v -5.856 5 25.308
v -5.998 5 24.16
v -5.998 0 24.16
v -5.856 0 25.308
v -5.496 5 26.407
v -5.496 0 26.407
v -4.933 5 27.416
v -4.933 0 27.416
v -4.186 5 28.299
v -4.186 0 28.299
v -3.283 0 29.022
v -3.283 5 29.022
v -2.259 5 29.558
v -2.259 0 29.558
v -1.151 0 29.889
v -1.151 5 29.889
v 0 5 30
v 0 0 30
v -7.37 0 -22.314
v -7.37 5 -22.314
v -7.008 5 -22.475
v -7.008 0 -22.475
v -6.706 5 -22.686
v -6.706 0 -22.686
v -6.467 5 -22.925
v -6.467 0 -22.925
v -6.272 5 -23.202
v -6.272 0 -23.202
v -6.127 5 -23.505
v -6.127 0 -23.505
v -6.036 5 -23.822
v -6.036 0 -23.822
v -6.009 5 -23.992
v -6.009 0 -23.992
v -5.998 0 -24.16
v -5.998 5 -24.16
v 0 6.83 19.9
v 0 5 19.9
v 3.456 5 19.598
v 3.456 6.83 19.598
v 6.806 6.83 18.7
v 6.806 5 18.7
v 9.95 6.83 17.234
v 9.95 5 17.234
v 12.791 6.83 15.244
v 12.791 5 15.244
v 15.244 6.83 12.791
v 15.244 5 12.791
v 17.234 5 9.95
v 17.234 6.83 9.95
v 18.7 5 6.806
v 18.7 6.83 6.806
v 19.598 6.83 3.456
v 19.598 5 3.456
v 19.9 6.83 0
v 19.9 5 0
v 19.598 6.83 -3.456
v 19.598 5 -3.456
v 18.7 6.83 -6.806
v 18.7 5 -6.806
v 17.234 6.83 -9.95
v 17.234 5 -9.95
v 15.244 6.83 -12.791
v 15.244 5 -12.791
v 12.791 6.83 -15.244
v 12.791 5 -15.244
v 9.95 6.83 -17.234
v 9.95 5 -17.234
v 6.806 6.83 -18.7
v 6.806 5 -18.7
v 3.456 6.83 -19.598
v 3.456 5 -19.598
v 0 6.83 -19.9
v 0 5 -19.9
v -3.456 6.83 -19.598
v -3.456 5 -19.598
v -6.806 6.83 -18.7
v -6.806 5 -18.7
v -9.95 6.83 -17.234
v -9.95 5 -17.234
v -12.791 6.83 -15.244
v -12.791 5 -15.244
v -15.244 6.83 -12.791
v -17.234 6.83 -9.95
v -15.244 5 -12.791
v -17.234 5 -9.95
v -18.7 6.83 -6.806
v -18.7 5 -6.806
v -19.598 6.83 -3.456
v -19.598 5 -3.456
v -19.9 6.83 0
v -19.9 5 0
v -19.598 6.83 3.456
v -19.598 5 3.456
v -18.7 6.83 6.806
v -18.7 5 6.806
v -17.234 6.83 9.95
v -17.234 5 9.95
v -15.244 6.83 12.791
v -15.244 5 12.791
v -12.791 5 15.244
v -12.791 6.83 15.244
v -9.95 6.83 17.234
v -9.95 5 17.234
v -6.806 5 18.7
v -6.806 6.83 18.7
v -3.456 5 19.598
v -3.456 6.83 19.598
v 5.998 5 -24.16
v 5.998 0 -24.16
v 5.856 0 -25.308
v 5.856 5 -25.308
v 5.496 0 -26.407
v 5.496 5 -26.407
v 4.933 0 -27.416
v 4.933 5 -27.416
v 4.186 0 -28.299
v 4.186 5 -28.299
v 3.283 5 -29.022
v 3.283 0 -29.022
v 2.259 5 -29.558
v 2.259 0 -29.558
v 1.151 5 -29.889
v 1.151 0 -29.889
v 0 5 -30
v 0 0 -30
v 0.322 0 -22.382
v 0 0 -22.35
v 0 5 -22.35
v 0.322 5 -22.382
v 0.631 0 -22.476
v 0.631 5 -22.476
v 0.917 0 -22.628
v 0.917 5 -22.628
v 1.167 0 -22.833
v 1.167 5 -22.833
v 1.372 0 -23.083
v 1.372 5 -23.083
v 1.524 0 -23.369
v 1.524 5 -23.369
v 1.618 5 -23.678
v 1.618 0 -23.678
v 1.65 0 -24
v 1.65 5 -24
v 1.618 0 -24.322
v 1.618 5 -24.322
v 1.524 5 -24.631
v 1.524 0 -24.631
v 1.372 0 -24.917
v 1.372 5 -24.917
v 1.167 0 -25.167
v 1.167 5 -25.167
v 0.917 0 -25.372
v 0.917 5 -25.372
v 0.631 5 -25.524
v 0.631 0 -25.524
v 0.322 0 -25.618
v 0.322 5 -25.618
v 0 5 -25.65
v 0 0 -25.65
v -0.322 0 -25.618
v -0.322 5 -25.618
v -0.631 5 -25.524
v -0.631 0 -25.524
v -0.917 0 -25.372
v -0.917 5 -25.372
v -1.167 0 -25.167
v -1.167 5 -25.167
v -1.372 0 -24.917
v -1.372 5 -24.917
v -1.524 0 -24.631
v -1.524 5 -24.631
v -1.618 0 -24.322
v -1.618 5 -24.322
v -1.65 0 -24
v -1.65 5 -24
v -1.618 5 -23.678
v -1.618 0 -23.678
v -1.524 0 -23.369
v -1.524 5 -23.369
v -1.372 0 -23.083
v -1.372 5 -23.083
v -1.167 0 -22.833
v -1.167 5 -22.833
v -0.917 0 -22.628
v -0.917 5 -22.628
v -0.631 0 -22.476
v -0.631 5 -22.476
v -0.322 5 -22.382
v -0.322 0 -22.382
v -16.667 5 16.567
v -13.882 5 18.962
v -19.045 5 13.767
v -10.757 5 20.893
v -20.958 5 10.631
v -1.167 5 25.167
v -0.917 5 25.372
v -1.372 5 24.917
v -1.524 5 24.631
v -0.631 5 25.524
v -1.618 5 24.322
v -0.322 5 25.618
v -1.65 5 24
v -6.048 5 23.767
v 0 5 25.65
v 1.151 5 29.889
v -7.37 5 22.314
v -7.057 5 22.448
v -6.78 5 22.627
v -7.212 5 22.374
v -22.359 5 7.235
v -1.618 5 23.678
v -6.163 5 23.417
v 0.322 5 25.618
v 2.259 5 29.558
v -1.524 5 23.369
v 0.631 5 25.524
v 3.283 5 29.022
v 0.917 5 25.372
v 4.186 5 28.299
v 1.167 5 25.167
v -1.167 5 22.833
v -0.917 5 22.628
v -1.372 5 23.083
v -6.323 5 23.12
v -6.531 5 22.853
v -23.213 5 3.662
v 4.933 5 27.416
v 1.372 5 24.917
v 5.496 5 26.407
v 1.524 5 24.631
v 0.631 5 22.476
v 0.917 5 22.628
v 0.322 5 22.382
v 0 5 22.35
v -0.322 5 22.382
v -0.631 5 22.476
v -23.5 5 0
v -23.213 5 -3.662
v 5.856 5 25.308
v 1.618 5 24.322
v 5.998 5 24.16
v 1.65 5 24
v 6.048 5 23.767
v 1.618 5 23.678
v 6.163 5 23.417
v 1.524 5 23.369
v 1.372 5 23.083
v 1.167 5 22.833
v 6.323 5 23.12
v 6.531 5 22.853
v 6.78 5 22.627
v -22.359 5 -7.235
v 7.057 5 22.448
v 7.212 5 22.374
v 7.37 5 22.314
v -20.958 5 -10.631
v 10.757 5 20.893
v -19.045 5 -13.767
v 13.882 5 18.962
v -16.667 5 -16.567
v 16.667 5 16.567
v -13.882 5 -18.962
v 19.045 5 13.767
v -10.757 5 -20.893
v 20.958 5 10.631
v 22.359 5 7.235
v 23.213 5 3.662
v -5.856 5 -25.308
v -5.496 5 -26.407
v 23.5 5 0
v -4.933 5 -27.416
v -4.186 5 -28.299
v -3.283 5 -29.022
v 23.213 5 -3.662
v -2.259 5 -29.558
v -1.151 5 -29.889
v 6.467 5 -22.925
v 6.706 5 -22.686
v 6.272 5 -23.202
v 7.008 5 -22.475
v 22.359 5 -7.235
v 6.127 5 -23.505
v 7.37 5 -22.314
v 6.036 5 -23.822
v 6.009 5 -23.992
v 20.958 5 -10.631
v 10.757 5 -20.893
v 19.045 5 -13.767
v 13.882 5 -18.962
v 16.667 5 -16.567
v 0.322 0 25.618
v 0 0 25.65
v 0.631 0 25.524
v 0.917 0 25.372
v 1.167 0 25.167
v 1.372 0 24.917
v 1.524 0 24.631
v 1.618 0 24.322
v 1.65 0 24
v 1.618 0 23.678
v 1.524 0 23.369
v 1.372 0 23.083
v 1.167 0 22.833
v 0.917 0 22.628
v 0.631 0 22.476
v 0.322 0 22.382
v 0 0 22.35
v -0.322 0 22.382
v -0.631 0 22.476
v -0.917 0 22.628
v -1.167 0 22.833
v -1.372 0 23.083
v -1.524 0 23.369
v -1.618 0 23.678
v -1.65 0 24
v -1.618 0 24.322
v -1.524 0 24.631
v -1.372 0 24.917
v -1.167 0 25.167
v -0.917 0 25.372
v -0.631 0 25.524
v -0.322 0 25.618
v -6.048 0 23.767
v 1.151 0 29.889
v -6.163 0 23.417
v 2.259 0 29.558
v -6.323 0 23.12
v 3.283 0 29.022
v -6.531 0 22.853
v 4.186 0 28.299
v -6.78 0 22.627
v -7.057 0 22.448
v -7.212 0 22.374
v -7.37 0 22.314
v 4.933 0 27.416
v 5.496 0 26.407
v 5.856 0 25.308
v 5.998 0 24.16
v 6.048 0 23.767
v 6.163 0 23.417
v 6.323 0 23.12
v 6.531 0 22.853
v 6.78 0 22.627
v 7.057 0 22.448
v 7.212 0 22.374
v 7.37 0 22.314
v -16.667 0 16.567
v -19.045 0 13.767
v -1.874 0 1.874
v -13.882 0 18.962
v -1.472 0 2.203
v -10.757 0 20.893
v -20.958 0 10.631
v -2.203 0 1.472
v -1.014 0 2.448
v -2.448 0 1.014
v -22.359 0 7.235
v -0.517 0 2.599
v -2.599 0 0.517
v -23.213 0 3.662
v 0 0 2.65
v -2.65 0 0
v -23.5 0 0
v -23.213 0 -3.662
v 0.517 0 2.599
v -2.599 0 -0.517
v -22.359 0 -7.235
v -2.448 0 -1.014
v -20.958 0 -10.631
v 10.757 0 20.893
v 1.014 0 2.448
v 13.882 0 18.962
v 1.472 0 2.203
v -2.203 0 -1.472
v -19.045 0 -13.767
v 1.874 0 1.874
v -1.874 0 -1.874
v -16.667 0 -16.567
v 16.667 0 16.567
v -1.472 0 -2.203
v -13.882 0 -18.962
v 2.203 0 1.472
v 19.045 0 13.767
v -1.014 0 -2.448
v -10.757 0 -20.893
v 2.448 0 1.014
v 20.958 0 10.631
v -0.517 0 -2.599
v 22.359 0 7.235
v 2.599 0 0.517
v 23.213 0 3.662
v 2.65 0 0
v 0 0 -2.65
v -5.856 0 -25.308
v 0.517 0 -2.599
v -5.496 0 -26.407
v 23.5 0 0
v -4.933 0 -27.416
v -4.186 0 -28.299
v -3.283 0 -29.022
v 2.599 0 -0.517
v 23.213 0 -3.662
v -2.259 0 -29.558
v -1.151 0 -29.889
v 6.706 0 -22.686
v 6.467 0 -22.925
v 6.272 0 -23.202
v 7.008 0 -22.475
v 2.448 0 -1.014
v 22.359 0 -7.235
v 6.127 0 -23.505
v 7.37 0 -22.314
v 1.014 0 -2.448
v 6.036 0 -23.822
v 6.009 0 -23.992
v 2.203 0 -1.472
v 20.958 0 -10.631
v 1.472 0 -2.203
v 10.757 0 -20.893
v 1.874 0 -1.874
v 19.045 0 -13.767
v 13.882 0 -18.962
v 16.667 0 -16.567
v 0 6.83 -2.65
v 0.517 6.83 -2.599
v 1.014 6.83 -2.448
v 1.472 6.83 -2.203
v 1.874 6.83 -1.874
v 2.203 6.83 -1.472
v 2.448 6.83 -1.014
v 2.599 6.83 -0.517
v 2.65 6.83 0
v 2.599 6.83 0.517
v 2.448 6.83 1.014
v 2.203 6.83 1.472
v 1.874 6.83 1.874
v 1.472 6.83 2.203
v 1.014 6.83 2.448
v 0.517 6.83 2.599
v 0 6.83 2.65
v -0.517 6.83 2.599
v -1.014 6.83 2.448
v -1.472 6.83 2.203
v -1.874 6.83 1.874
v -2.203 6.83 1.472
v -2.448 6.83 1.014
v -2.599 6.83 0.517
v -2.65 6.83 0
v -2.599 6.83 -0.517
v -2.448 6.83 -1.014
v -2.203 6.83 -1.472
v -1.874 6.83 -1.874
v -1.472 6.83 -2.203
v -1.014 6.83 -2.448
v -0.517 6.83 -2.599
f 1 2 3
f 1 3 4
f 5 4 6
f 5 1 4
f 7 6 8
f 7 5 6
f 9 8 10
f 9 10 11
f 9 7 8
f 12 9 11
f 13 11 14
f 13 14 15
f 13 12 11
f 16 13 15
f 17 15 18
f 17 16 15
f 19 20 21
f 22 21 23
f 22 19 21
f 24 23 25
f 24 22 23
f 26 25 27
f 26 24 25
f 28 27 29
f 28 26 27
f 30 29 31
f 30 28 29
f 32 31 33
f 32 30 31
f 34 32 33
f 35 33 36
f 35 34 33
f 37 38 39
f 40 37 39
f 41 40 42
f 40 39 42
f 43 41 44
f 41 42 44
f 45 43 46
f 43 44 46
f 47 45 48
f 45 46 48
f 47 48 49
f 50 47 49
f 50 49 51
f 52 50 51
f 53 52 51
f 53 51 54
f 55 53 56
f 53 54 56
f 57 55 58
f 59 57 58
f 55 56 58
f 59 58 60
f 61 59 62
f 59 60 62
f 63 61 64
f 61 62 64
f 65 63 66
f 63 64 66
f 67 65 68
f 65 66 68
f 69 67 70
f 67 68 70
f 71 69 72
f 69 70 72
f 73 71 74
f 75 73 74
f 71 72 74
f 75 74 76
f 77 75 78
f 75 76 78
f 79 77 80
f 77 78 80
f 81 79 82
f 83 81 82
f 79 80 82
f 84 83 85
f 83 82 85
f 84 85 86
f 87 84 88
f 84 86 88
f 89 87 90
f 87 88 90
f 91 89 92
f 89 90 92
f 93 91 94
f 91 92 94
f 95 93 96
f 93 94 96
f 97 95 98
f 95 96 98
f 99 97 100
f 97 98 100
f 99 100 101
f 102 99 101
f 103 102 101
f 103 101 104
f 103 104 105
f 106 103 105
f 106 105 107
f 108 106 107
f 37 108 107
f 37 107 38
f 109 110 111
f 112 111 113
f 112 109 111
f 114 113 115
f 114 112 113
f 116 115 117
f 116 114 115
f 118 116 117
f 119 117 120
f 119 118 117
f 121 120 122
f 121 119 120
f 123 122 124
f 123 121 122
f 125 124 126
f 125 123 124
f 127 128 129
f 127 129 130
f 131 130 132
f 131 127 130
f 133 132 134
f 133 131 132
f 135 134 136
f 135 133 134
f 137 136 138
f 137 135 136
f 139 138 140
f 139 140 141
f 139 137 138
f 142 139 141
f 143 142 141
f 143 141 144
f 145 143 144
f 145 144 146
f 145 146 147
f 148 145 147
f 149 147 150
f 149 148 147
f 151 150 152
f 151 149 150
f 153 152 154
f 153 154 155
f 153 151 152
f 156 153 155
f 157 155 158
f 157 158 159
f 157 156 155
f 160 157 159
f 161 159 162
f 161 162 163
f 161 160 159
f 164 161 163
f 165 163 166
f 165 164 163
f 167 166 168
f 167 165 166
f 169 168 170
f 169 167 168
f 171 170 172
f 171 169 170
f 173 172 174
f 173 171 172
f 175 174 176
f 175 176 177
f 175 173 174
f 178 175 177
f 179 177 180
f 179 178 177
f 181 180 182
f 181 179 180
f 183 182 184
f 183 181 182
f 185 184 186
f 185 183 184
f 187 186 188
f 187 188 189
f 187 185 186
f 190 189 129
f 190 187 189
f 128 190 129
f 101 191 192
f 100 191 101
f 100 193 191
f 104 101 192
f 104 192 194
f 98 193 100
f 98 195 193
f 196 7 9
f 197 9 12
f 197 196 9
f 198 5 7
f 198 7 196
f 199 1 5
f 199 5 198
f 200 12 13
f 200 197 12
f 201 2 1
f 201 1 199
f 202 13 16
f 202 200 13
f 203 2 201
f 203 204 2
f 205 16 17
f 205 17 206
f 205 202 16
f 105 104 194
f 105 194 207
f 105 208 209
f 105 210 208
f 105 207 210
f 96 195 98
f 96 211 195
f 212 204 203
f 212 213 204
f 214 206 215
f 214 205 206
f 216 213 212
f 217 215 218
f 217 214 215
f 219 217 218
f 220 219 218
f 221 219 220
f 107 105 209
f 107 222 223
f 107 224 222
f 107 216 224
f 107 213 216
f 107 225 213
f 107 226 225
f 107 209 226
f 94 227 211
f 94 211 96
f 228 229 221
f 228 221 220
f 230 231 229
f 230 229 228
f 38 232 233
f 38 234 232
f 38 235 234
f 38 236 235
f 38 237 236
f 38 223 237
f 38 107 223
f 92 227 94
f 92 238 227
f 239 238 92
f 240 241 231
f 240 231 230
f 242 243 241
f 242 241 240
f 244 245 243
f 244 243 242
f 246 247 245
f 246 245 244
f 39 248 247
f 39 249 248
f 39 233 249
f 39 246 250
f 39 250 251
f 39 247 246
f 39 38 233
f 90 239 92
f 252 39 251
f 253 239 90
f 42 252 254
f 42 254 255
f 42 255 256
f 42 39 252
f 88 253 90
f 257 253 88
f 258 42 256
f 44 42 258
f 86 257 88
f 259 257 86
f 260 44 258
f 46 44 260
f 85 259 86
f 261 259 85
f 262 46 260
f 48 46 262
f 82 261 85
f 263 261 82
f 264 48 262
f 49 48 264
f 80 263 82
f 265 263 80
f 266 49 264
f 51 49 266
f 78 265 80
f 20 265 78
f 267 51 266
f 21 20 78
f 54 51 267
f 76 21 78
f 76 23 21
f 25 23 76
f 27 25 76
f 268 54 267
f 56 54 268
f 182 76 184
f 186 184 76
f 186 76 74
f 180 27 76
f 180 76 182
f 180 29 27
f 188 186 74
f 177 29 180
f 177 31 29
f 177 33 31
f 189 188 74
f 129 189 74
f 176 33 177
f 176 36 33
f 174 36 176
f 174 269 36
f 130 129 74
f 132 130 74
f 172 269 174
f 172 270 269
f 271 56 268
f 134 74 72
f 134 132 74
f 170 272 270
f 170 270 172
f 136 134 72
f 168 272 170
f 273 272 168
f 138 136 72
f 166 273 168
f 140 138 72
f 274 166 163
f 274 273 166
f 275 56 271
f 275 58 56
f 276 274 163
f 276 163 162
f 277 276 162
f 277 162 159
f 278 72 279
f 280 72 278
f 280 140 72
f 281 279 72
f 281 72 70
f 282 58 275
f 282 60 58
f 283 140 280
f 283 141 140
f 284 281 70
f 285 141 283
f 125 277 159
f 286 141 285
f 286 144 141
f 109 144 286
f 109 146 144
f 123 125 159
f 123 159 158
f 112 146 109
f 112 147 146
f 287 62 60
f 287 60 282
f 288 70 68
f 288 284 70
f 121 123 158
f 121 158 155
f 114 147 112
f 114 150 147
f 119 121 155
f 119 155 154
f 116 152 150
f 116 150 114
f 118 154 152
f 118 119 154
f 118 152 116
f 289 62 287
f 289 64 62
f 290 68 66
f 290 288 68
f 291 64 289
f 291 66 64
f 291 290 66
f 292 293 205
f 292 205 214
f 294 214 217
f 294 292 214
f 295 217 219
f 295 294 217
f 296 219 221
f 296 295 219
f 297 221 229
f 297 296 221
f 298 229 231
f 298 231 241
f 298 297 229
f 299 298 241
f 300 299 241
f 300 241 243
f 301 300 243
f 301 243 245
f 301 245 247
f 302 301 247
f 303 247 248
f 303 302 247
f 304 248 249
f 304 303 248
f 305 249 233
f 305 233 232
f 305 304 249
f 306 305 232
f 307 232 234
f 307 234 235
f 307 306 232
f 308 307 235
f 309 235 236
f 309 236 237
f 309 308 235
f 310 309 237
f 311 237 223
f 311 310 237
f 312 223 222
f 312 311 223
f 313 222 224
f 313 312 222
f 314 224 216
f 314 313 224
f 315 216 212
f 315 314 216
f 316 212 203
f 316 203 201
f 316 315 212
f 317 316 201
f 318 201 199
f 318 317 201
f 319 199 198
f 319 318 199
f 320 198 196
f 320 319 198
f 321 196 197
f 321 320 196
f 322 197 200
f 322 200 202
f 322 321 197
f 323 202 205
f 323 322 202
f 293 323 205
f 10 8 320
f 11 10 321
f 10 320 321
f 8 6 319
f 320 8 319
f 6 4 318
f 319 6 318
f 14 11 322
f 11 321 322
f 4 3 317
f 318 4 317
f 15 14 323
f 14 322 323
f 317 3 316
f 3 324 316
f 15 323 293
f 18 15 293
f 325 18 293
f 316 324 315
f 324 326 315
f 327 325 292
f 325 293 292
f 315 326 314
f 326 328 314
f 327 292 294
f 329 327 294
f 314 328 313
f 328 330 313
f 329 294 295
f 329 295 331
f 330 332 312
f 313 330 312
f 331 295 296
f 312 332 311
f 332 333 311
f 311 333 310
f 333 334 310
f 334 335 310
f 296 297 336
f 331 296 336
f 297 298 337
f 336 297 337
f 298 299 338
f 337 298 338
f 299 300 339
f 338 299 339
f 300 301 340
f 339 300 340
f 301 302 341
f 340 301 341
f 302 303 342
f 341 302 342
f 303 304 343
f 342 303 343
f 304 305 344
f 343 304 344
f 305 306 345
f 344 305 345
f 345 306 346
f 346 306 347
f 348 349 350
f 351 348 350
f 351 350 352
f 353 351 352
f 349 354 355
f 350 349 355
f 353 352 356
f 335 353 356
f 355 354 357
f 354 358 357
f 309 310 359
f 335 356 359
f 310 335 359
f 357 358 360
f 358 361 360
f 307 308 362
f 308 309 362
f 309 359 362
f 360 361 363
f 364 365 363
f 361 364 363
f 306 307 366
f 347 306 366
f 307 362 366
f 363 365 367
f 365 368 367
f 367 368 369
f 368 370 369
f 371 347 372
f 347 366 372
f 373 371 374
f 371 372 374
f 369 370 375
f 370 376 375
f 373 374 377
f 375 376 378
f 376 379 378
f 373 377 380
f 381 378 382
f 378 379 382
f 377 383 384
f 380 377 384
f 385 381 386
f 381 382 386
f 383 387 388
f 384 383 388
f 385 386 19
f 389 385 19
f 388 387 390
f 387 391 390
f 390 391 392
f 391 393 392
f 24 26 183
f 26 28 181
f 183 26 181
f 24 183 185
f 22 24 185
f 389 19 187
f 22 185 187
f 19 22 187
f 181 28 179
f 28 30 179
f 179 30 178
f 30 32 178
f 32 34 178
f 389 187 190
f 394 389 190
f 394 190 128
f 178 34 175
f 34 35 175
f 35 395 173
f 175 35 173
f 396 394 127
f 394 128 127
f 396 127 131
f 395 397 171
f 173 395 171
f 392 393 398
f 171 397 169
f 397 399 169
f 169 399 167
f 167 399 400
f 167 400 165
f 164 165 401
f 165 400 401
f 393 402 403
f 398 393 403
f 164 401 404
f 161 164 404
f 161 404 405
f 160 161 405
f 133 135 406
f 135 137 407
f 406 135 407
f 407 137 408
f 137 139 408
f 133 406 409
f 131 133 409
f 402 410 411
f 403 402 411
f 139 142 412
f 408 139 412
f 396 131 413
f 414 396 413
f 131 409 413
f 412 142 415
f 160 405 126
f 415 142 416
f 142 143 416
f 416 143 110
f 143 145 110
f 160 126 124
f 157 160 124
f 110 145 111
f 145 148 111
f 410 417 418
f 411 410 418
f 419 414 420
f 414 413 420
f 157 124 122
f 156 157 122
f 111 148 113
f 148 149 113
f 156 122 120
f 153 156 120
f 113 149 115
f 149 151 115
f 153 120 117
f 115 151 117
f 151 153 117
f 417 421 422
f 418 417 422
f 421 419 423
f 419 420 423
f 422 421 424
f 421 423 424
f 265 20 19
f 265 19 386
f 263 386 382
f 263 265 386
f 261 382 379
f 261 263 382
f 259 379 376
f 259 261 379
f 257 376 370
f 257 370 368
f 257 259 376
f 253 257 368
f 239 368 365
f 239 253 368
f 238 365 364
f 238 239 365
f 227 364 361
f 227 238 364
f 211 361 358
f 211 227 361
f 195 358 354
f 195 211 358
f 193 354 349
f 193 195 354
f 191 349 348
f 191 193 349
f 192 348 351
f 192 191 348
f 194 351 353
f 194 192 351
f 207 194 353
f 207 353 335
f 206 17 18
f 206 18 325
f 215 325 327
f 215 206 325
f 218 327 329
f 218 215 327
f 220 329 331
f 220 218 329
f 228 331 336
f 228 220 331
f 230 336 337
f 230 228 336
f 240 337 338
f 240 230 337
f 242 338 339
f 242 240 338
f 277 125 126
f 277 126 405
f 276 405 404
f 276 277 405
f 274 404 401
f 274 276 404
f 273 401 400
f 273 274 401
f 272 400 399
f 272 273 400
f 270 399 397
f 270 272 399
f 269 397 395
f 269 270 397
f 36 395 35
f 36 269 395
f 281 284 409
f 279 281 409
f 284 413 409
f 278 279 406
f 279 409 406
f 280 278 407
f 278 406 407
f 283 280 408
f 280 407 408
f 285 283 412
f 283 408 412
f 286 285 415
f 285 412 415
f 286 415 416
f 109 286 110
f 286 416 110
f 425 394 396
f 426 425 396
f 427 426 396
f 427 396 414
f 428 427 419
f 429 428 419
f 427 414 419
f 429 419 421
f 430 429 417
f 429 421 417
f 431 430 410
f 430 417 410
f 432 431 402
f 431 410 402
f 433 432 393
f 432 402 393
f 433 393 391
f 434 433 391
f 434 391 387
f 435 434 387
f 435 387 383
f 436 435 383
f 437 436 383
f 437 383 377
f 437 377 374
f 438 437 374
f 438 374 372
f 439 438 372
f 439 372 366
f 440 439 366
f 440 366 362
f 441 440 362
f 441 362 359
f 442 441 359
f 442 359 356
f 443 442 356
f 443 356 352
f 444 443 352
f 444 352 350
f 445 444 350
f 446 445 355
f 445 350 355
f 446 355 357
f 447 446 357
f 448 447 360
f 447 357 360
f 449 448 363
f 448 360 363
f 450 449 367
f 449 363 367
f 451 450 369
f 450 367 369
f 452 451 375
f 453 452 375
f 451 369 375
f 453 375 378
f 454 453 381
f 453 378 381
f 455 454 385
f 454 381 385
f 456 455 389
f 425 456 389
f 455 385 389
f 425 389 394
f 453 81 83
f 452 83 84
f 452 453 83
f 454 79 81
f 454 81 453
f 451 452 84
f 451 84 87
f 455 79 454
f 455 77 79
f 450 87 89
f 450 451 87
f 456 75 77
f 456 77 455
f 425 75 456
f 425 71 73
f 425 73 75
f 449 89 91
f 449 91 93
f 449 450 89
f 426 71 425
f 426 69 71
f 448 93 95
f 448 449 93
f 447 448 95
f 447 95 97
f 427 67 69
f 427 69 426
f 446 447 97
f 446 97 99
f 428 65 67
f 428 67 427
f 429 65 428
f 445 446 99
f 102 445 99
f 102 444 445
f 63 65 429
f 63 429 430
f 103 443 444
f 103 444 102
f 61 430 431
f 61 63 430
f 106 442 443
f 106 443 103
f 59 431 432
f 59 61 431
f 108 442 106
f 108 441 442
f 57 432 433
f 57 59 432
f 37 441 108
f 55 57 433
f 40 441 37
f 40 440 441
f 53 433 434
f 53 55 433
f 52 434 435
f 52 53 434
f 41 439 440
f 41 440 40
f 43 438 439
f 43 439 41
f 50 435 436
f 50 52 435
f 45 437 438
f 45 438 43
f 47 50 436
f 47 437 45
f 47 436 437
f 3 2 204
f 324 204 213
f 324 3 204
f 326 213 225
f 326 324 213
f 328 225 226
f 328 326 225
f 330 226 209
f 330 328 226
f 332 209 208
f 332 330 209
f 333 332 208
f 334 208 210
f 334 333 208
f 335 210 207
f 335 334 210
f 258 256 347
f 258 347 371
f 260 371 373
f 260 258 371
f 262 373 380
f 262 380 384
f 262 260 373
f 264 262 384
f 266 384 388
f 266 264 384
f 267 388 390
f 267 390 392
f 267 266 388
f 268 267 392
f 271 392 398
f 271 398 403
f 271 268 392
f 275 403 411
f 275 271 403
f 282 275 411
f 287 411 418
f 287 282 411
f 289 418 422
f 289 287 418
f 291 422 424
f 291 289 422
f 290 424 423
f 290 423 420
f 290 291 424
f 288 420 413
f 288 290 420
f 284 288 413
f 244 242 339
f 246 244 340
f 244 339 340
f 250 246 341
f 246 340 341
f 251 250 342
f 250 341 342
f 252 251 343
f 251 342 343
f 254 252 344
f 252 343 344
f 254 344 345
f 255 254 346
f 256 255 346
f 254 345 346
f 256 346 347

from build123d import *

# Parameters (mm, degrees)
SKETCH1_W           = 60
SKETCH1_H           = 60
SKETCH1_R           = 1.65
BOSS_EXTRUDE1_DEPTH = 5
SKETCH2_R           = 19.9
BOSS_EXTRUDE2_DEPTH = 1.83
SKETCH3_OUTSIDE_W   = 79.026
SKETCH3_OUTSIDE_H   = 79.026
CUT_EXTRUDE1_DEPTH  = 43.720018727
SKETCH4_R           = 2.65
CUT_EXTRUDE2_DEPTH  = 39.715615713
FILLET1_R           = 2


with BuildPart() as part:
    # Sketch1 → Boss-Extrude1 (new body)
    with BuildSketch(Plane(origin=(0, 0, 0), x_dir=(1, 0, 0), z_dir=(0, 1, 0))):
        Rectangle(SKETCH1_W, SKETCH1_H)
        with Locations(Location((0, 24, 0), (0, 0, 270))):
            Circle(SKETCH1_R, mode=Mode.SUBTRACT)
        with Locations(Location((0, -24, 0), (0, 0, 270))):
            Circle(SKETCH1_R, mode=Mode.SUBTRACT)
    extrude(amount=BOSS_EXTRUDE1_DEPTH)

    # Sketch2 → Boss-Extrude2 (add)
    with BuildSketch(Plane(origin=(0, 5, 0), x_dir=(1, 0, 0), z_dir=(0, 1, 0))):
        with Locations(Location((0, 0, 0), (0, 0, 270))):
            Circle(SKETCH2_R)
    extrude(amount=BOSS_EXTRUDE2_DEPTH)

    # Sketch3 outside → Cut-Extrude1 (cut, through all)
    with BuildSketch(Plane(origin=(0, 5, 0), x_dir=(1, 0, 0), z_dir=(0, 1, 0))):
        Rectangle(SKETCH3_OUTSIDE_W, SKETCH3_OUTSIDE_H)
        with BuildLine():
            ThreePointArc((5.869454294, -22.755208333), (23.5, 0), (5.869454294, 22.755208333))
            ThreePointArc((5.869454294, 22.755208333), (4.66201405, 27.776986232), (0, 30))
            ThreePointArc((0, 30), (-4.66201405, 27.776986232), (-5.869454294, 22.755208333))
            ThreePointArc((-5.869454294, 22.755208333), (-23.5, 0), (-5.869454294, -22.755208333))
            ThreePointArc((-5.869454294, -22.755208333), (-4.66201405, -27.776986232), (0, -30))
            ThreePointArc((0, -30), (4.66201405, -27.776986232), (5.869454294, -22.755208333))
        make_face(mode=Mode.SUBTRACT)
    extrude(amount=-CUT_EXTRUDE1_DEPTH, mode=Mode.SUBTRACT)

    # Sketch4 → Cut-Extrude2 (cut, through all)
    with BuildSketch(Plane.XZ):
        with Locations(Location((0, 0, 0), (0, 0, 270))):
            Circle(SKETCH4_R)
    extrude(amount=-CUT_EXTRUDE2_DEPTH, mode=Mode.SUBTRACT)

    # Fillet1
    fillet1_edges = [part.edges().sort_by_distance(p)[0] for p in [
        (5.869454294, 2.5, -22.755208333),
        (-5.869454294, 2.5, 22.755208333),
        (5.869454294, 2.5, 22.755208333),
        (-5.869454294, 2.5, -22.755208333),
    ]]
    fillet(fillet1_edges, radius=FILLET1_R)


solid = part.part
